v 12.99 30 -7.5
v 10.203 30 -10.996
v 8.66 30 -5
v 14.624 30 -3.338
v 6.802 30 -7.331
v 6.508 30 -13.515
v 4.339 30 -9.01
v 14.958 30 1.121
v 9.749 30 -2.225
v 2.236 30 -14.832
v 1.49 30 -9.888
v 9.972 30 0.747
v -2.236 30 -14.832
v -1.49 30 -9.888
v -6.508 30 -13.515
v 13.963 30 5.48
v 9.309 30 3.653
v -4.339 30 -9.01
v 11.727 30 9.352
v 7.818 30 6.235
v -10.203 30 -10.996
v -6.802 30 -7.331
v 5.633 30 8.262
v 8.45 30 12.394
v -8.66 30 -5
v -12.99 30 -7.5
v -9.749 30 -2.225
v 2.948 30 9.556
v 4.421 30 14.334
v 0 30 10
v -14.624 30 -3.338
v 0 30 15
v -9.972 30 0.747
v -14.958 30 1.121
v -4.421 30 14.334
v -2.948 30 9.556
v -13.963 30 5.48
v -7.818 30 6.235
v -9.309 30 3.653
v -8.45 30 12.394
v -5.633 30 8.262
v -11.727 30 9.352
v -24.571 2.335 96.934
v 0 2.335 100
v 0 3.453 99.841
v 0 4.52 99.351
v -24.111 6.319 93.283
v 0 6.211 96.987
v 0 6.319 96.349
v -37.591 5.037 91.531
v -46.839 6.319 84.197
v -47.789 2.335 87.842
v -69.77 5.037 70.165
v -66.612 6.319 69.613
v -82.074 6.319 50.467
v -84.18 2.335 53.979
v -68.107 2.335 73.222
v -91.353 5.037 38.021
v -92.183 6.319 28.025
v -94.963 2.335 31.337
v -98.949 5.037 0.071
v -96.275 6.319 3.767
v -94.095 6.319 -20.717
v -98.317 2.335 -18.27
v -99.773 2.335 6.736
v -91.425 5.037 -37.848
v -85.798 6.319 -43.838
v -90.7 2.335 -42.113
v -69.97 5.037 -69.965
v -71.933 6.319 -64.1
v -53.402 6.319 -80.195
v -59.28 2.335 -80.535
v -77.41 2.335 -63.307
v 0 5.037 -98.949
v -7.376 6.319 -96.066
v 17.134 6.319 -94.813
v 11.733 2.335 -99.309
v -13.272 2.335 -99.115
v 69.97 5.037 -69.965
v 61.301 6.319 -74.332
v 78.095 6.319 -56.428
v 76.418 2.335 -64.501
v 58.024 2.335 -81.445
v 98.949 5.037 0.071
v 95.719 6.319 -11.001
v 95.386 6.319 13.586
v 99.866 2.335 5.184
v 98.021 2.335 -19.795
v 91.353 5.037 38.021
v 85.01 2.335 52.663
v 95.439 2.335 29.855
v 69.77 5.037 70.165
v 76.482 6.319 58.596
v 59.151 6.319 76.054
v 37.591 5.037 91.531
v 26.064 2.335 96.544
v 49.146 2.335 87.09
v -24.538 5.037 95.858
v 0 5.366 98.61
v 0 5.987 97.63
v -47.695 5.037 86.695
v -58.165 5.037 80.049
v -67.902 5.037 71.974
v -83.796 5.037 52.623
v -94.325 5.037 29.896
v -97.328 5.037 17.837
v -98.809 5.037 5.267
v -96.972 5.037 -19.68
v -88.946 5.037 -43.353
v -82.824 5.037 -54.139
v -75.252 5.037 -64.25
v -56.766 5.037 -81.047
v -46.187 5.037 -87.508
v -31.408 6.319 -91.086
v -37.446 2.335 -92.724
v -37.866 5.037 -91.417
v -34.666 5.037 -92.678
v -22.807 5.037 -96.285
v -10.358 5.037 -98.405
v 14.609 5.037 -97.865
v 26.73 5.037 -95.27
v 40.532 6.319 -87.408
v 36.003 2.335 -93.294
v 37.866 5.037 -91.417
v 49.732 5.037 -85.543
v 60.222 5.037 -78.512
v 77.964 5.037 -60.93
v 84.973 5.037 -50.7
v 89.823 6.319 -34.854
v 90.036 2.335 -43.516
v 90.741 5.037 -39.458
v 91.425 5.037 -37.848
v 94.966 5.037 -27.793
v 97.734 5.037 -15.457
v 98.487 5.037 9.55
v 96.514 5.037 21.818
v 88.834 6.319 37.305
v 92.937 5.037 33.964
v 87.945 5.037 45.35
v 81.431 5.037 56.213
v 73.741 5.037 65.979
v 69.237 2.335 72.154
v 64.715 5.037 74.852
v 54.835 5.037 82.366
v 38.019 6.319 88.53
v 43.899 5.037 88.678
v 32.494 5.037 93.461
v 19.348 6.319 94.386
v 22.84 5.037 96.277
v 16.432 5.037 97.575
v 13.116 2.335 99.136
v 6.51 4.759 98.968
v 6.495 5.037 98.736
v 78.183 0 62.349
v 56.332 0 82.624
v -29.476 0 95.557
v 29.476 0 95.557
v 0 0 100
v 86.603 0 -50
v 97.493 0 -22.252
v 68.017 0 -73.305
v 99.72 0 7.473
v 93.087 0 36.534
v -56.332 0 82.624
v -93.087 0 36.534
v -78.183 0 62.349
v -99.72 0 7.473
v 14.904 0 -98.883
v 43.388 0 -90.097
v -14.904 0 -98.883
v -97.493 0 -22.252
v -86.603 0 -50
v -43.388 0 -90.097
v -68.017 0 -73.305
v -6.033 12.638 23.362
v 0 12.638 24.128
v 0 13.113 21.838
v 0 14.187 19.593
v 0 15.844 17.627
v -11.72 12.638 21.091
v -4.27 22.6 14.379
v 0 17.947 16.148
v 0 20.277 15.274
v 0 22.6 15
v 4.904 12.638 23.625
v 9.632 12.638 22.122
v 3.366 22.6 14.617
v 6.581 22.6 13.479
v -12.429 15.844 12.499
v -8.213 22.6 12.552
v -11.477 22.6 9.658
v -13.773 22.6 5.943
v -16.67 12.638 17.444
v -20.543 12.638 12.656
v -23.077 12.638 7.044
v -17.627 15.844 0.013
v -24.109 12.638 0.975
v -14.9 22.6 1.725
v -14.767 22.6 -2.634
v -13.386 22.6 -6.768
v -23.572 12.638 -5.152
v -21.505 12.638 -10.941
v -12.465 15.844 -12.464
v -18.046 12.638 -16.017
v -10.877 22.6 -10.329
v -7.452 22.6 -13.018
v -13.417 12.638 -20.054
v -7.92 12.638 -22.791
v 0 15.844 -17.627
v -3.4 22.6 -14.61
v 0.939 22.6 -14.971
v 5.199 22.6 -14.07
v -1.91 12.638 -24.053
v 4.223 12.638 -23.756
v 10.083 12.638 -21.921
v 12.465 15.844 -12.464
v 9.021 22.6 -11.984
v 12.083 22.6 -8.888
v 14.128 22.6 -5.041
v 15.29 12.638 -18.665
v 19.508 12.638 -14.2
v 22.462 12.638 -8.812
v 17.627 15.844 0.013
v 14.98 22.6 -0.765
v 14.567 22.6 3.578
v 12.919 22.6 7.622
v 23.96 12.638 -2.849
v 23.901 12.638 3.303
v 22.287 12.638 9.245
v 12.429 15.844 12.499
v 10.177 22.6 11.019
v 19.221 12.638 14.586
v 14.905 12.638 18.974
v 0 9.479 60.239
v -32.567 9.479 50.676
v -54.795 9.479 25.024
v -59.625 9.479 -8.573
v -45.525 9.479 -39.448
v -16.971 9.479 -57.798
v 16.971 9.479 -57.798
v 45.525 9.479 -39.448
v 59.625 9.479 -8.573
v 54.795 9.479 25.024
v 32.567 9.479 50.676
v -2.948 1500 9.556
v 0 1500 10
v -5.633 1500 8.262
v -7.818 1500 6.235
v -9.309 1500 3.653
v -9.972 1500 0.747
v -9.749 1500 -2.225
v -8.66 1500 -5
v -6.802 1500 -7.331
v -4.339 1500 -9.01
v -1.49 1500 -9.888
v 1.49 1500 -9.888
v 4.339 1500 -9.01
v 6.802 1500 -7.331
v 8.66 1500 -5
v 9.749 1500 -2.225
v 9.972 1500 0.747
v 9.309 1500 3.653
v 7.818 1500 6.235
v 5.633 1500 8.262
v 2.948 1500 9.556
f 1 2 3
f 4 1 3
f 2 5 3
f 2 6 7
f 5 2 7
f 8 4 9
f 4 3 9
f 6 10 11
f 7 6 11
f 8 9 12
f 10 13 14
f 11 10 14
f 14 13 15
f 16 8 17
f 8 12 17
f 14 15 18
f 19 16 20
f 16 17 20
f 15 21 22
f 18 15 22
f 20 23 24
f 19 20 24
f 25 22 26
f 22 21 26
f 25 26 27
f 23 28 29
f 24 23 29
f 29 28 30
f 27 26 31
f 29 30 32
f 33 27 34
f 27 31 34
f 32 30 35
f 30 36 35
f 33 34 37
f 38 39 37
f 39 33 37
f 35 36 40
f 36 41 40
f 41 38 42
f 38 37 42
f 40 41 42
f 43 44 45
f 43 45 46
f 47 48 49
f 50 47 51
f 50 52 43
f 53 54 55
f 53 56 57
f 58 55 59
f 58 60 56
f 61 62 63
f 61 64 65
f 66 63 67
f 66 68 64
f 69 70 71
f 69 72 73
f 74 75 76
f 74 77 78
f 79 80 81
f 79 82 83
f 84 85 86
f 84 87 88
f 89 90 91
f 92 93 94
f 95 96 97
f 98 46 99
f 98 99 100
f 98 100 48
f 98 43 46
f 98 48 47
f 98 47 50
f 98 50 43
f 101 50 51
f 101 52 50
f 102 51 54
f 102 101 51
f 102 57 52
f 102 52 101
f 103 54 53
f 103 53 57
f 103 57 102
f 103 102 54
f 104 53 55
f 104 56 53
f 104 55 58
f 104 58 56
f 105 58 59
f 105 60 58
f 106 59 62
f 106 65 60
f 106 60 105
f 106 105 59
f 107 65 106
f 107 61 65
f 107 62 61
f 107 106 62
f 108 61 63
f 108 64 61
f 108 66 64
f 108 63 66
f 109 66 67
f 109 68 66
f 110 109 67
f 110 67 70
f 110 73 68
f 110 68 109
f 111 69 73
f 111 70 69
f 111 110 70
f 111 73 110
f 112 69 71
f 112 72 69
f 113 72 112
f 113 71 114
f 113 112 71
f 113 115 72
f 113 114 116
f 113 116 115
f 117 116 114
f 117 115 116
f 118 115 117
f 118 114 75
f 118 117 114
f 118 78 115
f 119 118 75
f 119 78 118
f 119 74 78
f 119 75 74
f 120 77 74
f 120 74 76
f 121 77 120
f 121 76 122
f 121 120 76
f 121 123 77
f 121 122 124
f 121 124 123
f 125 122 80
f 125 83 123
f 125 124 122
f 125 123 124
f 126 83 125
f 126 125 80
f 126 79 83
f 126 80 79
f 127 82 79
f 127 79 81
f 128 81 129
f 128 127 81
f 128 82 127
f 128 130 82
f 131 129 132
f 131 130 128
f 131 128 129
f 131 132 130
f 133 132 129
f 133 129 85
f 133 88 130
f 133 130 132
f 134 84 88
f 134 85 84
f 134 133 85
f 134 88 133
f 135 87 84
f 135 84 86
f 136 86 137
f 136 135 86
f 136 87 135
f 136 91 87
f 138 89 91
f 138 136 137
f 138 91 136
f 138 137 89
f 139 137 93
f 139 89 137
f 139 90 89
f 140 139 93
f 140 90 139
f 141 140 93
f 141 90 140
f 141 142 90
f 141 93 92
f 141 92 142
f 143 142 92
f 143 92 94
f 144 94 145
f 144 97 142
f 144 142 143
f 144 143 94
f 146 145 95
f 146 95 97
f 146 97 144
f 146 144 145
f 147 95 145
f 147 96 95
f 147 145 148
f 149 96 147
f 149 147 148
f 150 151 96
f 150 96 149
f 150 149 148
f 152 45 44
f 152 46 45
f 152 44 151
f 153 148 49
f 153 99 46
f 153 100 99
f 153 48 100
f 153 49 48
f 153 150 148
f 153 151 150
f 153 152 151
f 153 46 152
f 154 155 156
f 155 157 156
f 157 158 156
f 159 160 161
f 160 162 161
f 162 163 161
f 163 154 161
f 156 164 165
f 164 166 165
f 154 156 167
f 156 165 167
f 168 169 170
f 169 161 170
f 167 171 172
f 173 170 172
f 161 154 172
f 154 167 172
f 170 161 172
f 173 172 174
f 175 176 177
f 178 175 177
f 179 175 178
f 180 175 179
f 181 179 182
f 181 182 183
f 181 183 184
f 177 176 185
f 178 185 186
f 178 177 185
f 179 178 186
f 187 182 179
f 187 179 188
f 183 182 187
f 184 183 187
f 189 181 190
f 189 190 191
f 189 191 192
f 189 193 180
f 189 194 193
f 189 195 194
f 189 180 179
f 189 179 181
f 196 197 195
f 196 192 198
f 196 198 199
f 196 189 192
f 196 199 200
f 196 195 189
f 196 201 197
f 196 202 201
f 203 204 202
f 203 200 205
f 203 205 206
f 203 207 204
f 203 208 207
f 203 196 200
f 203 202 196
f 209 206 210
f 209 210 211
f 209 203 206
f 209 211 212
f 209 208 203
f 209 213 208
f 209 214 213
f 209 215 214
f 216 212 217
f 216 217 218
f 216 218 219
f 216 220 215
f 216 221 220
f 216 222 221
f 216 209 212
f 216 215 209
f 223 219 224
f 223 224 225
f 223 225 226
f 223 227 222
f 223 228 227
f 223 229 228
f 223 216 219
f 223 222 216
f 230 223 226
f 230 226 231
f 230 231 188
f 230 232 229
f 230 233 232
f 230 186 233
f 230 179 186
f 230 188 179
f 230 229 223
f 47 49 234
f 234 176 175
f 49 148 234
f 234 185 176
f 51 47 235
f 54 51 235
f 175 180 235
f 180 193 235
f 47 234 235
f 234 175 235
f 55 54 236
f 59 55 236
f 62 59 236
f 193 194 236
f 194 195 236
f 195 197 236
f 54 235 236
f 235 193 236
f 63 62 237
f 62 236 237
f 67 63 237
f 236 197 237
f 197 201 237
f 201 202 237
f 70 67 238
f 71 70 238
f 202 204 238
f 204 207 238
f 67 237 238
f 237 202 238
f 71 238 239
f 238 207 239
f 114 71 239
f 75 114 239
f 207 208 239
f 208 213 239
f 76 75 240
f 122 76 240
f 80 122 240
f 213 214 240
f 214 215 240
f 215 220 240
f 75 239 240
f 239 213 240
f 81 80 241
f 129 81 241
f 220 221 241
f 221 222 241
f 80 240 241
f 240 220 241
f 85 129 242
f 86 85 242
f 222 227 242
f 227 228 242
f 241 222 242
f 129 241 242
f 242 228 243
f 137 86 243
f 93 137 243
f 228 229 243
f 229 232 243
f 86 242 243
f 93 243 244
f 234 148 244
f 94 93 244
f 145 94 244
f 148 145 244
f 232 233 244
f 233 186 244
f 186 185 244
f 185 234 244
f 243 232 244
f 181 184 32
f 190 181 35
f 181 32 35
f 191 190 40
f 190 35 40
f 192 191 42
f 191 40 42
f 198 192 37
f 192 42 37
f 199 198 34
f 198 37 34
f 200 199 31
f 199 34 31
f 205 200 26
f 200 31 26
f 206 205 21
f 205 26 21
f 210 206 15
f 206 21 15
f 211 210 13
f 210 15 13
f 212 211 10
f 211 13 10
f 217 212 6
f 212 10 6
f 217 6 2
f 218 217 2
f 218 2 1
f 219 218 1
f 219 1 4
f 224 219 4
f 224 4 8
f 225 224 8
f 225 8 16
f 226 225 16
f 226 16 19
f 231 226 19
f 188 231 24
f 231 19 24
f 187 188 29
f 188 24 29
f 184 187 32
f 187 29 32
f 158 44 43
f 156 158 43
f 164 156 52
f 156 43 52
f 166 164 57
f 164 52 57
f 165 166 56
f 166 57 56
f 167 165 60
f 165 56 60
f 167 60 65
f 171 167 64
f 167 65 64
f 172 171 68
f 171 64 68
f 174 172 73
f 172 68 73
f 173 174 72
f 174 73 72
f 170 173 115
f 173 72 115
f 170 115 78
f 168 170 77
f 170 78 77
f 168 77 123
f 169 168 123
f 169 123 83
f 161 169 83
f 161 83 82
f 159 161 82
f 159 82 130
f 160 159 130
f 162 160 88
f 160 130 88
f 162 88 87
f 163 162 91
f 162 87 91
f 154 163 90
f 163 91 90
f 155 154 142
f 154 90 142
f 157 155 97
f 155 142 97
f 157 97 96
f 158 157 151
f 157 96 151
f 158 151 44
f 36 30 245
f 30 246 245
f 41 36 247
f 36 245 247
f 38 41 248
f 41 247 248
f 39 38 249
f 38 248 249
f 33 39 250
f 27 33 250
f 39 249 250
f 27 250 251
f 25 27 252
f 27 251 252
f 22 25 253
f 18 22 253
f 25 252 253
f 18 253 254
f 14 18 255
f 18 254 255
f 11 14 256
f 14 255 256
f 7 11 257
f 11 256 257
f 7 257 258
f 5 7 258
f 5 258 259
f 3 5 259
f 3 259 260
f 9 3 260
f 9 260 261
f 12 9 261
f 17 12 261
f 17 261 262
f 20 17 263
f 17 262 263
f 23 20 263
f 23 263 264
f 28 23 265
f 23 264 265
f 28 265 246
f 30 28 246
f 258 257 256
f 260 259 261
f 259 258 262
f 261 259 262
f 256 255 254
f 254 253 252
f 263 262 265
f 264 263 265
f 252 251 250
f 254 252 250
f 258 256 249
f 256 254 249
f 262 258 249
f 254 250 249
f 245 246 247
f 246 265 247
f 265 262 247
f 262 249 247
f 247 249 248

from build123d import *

# Parameters (mm, degrees)
FILLET1_R = 4
FILLET2_R = 10


with BuildPart() as part:
    # Sketch1 → Revolve1 (revolve)
    with BuildSketch(Plane.XY, mode=Mode.PRIVATE) as revolve1_sk:
        Polygon((0, 0), (-100, 0), (-100, 6), (-15, 13.4365364), (-15, 30), (-10, 30), (-10, 1500), (0, 1500), align=None)
    revolve(revolve1_sk.sketch.rotate(Axis((0, 0, 0), (0, -1, 0)), 270), axis=Axis((0, 0, 0), (0, -1, 0)))

    # Fillet1
    fillet1_edges = [part.edges().sort_by_distance(p)[0] for p in [
        (0, 6, -100),
    ]]
    fillet(fillet1_edges, radius=FILLET1_R)

    # Fillet2
    fillet2_edges = [part.edges().sort_by_distance(p)[0] for p in [
        (0, 13.4365364, -15),
    ]]
    fillet(fillet2_edges, radius=FILLET2_R)


solid = part.part
